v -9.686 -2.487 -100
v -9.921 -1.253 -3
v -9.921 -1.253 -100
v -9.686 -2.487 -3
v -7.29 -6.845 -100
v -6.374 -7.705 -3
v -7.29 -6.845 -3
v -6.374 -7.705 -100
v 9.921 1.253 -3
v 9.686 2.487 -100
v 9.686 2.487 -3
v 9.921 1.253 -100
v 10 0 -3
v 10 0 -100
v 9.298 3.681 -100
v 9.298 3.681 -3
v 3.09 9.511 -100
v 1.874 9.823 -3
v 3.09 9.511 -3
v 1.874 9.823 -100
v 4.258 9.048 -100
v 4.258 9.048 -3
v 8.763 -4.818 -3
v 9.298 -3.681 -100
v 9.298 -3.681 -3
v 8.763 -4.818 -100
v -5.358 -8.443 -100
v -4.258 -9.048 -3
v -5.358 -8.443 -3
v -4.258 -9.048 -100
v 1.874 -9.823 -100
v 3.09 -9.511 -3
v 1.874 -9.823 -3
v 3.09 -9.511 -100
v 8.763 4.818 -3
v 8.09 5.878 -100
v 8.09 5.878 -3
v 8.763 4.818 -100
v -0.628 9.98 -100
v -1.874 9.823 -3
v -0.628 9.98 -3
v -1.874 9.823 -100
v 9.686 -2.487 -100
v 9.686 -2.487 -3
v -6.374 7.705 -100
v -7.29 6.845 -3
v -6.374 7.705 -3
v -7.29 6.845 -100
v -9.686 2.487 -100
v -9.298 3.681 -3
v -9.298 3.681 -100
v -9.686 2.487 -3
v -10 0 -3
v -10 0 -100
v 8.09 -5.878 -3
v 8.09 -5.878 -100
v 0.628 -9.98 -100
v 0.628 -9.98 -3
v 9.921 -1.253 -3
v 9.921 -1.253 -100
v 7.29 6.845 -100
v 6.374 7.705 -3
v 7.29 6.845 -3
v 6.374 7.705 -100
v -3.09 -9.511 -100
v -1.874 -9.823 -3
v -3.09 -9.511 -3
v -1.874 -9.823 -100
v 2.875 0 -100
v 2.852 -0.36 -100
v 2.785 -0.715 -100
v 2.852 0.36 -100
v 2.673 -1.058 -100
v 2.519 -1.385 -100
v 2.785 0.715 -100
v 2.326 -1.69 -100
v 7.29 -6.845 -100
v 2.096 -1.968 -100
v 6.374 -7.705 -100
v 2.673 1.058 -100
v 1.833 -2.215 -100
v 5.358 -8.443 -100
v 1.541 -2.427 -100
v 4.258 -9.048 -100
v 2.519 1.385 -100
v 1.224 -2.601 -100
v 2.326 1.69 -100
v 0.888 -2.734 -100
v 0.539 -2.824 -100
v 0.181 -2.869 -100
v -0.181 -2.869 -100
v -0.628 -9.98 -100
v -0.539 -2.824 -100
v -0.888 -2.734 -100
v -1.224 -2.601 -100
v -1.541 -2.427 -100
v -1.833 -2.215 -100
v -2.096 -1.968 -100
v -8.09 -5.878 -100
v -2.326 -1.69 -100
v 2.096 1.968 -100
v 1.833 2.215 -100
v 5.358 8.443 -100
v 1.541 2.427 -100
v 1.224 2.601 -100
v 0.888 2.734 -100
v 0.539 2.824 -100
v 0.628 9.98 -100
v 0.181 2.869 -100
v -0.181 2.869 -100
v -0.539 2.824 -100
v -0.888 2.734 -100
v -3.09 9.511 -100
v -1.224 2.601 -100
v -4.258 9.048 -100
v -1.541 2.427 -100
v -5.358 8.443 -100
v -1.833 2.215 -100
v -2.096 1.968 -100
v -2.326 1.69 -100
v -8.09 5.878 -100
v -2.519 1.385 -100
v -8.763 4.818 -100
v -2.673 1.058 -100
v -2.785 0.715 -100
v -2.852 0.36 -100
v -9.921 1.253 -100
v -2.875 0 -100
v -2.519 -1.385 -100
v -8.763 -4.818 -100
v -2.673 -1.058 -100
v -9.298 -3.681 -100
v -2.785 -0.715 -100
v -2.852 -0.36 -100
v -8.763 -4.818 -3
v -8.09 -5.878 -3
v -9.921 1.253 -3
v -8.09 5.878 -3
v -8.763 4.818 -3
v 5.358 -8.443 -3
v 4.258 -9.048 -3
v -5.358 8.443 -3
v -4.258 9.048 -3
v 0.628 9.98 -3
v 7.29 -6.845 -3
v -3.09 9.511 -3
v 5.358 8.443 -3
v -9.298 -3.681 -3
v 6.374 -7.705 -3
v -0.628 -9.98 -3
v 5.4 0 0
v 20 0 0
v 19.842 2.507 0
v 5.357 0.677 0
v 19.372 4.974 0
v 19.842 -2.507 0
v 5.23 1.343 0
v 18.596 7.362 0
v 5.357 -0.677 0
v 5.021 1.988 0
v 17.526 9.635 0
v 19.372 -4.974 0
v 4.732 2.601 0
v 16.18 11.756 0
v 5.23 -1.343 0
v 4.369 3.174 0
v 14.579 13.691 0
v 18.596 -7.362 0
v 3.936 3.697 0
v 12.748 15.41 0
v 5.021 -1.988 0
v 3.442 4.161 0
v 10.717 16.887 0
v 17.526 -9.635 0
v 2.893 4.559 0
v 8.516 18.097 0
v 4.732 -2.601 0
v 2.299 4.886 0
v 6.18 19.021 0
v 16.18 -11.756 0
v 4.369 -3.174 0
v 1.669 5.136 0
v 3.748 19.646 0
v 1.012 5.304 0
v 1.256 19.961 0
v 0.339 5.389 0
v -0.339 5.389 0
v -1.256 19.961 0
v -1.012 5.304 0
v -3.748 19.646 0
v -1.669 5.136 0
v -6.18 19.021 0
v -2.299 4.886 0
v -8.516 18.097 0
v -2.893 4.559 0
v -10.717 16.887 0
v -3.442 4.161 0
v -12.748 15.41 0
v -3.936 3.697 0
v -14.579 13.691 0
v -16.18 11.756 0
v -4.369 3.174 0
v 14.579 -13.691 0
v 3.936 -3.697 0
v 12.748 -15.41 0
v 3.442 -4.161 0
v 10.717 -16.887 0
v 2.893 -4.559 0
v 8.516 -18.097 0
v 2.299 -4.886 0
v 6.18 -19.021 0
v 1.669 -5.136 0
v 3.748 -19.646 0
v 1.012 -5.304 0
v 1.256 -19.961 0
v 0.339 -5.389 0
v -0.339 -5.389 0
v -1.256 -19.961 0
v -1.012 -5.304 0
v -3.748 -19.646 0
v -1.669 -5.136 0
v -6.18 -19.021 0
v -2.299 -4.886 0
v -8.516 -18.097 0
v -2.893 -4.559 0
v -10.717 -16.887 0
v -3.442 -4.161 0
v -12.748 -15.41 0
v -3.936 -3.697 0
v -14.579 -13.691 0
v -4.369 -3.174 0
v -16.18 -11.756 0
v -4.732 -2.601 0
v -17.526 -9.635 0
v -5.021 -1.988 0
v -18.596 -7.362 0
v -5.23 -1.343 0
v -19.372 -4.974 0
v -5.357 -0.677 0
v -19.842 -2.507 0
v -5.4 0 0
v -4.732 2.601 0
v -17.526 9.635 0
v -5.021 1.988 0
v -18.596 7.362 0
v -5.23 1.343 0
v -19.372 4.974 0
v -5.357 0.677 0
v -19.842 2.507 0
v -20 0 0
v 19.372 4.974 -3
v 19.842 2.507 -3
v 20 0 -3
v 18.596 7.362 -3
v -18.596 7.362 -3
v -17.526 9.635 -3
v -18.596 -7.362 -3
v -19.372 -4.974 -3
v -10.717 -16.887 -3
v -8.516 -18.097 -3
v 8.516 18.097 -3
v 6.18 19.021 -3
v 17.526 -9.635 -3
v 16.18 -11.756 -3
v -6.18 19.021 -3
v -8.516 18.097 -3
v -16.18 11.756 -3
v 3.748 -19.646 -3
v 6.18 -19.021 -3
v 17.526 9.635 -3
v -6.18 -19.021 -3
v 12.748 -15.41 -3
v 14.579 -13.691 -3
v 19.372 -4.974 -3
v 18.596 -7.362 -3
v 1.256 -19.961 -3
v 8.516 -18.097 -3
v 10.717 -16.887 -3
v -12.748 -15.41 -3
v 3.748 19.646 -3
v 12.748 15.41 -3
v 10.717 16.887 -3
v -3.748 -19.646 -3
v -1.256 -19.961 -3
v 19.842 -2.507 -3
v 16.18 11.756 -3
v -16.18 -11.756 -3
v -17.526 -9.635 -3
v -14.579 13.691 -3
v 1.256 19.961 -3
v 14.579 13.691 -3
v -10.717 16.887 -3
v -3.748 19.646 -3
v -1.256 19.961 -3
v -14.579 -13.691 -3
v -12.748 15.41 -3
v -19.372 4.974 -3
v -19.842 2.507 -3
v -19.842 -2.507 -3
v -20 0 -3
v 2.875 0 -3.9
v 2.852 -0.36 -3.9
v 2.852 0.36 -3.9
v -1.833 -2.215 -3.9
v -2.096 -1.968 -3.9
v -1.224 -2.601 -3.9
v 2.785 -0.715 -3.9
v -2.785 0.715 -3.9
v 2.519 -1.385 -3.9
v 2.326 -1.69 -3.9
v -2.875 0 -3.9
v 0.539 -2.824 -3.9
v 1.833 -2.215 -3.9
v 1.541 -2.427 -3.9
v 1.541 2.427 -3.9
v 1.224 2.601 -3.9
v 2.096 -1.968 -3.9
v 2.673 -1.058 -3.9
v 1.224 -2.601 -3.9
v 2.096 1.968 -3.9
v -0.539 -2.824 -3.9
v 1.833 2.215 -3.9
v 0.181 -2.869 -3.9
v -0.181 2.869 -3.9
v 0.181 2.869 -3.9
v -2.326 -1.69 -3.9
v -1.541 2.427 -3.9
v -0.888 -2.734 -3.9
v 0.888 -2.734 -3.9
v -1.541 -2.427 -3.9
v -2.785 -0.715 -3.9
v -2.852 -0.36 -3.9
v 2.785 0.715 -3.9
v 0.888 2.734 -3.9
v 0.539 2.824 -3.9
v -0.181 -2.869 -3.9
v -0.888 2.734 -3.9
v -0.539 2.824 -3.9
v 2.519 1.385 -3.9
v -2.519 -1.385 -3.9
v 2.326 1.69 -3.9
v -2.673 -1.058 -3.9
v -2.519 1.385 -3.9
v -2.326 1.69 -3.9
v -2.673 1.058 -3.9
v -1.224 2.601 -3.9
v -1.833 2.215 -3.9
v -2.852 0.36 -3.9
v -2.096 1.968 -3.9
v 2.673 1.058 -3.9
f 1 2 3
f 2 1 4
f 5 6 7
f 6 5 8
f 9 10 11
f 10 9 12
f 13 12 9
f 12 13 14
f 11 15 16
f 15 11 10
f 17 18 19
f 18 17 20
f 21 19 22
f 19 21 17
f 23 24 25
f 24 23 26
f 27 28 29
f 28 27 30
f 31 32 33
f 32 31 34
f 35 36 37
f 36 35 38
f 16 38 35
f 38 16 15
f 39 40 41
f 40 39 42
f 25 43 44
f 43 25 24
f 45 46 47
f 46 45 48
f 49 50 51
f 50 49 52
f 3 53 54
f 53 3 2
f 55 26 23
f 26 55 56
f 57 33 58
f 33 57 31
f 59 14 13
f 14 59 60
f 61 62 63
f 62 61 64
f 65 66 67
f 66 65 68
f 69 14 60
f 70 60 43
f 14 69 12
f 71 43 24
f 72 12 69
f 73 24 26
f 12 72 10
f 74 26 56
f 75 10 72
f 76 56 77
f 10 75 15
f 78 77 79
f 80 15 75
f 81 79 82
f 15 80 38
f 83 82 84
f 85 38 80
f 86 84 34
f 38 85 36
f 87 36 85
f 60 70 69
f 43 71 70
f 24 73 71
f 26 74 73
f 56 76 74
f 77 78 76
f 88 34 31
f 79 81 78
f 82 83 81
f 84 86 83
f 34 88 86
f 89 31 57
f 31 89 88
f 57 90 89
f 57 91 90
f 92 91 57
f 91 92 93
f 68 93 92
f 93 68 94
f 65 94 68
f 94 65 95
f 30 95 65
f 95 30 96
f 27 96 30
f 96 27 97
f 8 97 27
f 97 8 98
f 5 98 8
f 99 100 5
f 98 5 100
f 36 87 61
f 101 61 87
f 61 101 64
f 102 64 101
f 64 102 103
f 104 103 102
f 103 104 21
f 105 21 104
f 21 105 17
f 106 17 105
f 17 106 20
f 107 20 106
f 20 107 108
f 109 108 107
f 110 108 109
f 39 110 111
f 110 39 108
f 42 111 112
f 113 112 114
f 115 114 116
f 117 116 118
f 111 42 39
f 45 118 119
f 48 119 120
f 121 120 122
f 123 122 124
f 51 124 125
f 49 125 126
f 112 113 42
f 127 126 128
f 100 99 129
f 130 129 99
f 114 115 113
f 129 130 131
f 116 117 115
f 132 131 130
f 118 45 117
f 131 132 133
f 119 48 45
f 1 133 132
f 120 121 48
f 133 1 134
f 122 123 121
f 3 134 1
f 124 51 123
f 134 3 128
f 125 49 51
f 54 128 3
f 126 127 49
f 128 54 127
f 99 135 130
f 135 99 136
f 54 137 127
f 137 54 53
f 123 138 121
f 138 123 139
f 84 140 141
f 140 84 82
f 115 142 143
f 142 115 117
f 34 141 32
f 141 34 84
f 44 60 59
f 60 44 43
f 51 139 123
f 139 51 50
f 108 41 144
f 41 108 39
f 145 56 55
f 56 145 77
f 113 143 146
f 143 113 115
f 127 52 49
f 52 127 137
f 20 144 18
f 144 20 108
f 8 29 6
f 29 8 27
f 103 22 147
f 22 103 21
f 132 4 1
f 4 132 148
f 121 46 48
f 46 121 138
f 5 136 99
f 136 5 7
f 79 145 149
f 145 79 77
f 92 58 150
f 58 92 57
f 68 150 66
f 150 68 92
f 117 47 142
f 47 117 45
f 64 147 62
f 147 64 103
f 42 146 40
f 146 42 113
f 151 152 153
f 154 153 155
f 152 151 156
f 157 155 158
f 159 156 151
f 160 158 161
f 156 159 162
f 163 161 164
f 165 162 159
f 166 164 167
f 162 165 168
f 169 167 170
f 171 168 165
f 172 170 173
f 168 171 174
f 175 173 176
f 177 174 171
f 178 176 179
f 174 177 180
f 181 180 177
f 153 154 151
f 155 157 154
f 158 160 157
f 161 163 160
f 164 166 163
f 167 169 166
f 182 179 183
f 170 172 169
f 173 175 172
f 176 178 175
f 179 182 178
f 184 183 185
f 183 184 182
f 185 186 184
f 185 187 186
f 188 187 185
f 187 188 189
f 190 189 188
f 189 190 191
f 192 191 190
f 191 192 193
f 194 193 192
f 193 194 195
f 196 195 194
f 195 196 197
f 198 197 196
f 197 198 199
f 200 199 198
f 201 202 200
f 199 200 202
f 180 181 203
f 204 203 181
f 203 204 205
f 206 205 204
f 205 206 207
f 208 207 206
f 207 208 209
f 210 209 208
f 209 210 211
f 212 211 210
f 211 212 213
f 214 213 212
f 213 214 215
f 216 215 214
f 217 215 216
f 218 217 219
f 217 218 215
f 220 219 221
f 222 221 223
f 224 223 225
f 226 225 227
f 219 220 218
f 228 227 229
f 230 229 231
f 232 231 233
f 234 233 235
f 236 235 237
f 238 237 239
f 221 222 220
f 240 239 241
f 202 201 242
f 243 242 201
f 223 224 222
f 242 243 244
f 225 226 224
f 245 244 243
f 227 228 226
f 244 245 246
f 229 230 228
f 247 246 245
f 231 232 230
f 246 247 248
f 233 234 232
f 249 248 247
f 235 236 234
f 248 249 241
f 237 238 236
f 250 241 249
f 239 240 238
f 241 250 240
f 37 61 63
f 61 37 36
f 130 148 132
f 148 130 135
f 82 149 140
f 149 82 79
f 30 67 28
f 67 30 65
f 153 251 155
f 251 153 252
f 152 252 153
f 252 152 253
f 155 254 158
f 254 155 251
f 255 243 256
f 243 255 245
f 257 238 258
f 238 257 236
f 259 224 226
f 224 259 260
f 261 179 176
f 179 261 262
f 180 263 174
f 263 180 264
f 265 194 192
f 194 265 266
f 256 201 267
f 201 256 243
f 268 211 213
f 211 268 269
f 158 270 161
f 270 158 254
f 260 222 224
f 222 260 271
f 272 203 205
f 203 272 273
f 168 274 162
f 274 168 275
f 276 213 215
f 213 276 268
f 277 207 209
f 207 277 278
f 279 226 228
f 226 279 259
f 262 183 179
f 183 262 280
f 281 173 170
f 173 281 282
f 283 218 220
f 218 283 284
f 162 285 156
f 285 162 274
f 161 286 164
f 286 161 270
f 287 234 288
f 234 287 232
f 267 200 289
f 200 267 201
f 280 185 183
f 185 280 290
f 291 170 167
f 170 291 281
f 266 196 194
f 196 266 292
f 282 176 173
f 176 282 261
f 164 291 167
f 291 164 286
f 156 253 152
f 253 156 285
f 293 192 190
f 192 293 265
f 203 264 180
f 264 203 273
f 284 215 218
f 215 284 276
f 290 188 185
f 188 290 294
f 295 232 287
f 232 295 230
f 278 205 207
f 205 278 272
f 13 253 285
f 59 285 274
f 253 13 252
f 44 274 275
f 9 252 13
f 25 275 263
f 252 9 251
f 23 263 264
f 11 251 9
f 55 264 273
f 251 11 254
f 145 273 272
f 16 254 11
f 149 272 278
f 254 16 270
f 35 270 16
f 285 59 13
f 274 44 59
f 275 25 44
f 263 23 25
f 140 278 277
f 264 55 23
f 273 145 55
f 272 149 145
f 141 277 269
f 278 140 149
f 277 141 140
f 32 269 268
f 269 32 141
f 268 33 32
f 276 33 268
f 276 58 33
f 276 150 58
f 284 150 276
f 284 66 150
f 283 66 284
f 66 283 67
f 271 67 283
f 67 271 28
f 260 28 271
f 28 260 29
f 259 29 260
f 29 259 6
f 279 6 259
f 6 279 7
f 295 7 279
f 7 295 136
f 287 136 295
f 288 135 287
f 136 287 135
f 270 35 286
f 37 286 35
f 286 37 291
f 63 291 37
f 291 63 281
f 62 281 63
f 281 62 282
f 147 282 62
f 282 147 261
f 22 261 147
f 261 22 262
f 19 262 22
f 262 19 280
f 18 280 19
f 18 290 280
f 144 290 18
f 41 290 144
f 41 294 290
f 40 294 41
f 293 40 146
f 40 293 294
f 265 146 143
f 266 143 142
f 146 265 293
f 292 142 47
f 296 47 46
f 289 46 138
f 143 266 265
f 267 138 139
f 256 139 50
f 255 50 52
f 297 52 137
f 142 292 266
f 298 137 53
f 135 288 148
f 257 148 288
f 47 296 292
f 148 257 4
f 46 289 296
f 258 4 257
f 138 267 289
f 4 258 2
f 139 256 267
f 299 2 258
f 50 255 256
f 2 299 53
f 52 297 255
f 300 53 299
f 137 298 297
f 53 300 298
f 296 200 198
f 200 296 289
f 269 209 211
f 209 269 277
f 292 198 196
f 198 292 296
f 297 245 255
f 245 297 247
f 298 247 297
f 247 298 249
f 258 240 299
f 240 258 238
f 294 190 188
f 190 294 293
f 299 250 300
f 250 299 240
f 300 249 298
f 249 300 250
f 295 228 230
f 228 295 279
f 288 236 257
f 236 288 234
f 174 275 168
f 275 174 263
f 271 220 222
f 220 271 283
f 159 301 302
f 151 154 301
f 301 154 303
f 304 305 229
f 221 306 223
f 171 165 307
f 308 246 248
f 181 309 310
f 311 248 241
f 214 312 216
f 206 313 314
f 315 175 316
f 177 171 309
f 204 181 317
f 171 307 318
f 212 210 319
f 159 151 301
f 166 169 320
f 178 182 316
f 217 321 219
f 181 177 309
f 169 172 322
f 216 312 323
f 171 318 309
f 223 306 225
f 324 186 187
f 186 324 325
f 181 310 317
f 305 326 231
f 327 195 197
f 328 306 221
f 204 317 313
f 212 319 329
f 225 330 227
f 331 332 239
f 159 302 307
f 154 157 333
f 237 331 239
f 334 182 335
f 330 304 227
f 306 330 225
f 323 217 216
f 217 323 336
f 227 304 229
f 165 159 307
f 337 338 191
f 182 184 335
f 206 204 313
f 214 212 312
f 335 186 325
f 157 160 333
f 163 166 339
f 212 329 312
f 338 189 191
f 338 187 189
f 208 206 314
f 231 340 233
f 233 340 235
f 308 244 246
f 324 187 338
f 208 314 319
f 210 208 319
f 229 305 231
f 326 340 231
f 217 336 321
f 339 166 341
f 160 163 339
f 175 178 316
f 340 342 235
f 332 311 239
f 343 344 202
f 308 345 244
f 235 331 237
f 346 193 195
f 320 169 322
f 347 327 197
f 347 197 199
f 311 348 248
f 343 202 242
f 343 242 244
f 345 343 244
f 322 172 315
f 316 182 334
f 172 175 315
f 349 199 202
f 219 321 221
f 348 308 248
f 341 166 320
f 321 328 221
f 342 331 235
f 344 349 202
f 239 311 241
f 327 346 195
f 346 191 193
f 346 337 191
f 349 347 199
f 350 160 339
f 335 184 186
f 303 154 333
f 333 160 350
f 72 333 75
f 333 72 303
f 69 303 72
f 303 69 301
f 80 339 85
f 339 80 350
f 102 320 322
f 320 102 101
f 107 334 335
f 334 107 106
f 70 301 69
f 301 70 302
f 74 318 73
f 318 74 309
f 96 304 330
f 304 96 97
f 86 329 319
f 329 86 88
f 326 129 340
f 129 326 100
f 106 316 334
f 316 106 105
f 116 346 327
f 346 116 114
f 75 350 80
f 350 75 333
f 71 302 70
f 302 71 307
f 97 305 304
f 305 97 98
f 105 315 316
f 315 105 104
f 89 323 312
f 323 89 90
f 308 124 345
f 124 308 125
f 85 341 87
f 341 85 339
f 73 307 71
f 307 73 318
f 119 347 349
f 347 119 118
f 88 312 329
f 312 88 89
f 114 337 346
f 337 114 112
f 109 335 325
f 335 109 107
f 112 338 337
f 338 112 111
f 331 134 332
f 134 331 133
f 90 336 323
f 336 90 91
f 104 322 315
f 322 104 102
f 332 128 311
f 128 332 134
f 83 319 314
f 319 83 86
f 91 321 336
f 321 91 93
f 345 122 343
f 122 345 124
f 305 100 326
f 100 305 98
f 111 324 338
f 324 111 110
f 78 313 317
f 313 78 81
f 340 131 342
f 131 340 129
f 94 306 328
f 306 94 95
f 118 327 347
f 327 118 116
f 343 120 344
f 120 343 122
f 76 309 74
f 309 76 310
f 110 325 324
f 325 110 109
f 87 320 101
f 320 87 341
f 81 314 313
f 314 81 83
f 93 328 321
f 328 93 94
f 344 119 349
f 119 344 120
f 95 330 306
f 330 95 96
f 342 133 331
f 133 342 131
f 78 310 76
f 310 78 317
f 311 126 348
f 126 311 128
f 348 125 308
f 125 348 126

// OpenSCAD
$fn = 50;


difference() {
	union() {
		translate(v = [0, 0, -100.0000000000]) {
			cylinder(h = 100, r = 10.0000000000);
		}
		translate(v = [0, 0, -3.0000000000]) {
			cylinder(h = 3, r = 20.0000000000);
		}
	}
	union() {
		translate(v = [0, 0, 0]) {
			rotate(a = [0, 0, 0]) {
				difference() {
					union() {
						#translate(v = [0, 0, -100.0000000000]) {
							cylinder(h = 100, r = 2.6000000000);
						}
						#translate(v = [0, 0, -3.9000000000]) {
							cylinder(h = 3.9000000000, r1 = 2.8750000000, r2 = 5.4000000000);
						}
						#translate(v = [0, 0, -100.0000000000]) {
							cylinder(h = 100, r = 2.8750000000);
						}
						#translate(v = [0, 0, -100.0000000000]) {
							cylinder(h = 100, r = 2.6000000000);
						}
					}
					union();
				}
			}
		}
	}
}
